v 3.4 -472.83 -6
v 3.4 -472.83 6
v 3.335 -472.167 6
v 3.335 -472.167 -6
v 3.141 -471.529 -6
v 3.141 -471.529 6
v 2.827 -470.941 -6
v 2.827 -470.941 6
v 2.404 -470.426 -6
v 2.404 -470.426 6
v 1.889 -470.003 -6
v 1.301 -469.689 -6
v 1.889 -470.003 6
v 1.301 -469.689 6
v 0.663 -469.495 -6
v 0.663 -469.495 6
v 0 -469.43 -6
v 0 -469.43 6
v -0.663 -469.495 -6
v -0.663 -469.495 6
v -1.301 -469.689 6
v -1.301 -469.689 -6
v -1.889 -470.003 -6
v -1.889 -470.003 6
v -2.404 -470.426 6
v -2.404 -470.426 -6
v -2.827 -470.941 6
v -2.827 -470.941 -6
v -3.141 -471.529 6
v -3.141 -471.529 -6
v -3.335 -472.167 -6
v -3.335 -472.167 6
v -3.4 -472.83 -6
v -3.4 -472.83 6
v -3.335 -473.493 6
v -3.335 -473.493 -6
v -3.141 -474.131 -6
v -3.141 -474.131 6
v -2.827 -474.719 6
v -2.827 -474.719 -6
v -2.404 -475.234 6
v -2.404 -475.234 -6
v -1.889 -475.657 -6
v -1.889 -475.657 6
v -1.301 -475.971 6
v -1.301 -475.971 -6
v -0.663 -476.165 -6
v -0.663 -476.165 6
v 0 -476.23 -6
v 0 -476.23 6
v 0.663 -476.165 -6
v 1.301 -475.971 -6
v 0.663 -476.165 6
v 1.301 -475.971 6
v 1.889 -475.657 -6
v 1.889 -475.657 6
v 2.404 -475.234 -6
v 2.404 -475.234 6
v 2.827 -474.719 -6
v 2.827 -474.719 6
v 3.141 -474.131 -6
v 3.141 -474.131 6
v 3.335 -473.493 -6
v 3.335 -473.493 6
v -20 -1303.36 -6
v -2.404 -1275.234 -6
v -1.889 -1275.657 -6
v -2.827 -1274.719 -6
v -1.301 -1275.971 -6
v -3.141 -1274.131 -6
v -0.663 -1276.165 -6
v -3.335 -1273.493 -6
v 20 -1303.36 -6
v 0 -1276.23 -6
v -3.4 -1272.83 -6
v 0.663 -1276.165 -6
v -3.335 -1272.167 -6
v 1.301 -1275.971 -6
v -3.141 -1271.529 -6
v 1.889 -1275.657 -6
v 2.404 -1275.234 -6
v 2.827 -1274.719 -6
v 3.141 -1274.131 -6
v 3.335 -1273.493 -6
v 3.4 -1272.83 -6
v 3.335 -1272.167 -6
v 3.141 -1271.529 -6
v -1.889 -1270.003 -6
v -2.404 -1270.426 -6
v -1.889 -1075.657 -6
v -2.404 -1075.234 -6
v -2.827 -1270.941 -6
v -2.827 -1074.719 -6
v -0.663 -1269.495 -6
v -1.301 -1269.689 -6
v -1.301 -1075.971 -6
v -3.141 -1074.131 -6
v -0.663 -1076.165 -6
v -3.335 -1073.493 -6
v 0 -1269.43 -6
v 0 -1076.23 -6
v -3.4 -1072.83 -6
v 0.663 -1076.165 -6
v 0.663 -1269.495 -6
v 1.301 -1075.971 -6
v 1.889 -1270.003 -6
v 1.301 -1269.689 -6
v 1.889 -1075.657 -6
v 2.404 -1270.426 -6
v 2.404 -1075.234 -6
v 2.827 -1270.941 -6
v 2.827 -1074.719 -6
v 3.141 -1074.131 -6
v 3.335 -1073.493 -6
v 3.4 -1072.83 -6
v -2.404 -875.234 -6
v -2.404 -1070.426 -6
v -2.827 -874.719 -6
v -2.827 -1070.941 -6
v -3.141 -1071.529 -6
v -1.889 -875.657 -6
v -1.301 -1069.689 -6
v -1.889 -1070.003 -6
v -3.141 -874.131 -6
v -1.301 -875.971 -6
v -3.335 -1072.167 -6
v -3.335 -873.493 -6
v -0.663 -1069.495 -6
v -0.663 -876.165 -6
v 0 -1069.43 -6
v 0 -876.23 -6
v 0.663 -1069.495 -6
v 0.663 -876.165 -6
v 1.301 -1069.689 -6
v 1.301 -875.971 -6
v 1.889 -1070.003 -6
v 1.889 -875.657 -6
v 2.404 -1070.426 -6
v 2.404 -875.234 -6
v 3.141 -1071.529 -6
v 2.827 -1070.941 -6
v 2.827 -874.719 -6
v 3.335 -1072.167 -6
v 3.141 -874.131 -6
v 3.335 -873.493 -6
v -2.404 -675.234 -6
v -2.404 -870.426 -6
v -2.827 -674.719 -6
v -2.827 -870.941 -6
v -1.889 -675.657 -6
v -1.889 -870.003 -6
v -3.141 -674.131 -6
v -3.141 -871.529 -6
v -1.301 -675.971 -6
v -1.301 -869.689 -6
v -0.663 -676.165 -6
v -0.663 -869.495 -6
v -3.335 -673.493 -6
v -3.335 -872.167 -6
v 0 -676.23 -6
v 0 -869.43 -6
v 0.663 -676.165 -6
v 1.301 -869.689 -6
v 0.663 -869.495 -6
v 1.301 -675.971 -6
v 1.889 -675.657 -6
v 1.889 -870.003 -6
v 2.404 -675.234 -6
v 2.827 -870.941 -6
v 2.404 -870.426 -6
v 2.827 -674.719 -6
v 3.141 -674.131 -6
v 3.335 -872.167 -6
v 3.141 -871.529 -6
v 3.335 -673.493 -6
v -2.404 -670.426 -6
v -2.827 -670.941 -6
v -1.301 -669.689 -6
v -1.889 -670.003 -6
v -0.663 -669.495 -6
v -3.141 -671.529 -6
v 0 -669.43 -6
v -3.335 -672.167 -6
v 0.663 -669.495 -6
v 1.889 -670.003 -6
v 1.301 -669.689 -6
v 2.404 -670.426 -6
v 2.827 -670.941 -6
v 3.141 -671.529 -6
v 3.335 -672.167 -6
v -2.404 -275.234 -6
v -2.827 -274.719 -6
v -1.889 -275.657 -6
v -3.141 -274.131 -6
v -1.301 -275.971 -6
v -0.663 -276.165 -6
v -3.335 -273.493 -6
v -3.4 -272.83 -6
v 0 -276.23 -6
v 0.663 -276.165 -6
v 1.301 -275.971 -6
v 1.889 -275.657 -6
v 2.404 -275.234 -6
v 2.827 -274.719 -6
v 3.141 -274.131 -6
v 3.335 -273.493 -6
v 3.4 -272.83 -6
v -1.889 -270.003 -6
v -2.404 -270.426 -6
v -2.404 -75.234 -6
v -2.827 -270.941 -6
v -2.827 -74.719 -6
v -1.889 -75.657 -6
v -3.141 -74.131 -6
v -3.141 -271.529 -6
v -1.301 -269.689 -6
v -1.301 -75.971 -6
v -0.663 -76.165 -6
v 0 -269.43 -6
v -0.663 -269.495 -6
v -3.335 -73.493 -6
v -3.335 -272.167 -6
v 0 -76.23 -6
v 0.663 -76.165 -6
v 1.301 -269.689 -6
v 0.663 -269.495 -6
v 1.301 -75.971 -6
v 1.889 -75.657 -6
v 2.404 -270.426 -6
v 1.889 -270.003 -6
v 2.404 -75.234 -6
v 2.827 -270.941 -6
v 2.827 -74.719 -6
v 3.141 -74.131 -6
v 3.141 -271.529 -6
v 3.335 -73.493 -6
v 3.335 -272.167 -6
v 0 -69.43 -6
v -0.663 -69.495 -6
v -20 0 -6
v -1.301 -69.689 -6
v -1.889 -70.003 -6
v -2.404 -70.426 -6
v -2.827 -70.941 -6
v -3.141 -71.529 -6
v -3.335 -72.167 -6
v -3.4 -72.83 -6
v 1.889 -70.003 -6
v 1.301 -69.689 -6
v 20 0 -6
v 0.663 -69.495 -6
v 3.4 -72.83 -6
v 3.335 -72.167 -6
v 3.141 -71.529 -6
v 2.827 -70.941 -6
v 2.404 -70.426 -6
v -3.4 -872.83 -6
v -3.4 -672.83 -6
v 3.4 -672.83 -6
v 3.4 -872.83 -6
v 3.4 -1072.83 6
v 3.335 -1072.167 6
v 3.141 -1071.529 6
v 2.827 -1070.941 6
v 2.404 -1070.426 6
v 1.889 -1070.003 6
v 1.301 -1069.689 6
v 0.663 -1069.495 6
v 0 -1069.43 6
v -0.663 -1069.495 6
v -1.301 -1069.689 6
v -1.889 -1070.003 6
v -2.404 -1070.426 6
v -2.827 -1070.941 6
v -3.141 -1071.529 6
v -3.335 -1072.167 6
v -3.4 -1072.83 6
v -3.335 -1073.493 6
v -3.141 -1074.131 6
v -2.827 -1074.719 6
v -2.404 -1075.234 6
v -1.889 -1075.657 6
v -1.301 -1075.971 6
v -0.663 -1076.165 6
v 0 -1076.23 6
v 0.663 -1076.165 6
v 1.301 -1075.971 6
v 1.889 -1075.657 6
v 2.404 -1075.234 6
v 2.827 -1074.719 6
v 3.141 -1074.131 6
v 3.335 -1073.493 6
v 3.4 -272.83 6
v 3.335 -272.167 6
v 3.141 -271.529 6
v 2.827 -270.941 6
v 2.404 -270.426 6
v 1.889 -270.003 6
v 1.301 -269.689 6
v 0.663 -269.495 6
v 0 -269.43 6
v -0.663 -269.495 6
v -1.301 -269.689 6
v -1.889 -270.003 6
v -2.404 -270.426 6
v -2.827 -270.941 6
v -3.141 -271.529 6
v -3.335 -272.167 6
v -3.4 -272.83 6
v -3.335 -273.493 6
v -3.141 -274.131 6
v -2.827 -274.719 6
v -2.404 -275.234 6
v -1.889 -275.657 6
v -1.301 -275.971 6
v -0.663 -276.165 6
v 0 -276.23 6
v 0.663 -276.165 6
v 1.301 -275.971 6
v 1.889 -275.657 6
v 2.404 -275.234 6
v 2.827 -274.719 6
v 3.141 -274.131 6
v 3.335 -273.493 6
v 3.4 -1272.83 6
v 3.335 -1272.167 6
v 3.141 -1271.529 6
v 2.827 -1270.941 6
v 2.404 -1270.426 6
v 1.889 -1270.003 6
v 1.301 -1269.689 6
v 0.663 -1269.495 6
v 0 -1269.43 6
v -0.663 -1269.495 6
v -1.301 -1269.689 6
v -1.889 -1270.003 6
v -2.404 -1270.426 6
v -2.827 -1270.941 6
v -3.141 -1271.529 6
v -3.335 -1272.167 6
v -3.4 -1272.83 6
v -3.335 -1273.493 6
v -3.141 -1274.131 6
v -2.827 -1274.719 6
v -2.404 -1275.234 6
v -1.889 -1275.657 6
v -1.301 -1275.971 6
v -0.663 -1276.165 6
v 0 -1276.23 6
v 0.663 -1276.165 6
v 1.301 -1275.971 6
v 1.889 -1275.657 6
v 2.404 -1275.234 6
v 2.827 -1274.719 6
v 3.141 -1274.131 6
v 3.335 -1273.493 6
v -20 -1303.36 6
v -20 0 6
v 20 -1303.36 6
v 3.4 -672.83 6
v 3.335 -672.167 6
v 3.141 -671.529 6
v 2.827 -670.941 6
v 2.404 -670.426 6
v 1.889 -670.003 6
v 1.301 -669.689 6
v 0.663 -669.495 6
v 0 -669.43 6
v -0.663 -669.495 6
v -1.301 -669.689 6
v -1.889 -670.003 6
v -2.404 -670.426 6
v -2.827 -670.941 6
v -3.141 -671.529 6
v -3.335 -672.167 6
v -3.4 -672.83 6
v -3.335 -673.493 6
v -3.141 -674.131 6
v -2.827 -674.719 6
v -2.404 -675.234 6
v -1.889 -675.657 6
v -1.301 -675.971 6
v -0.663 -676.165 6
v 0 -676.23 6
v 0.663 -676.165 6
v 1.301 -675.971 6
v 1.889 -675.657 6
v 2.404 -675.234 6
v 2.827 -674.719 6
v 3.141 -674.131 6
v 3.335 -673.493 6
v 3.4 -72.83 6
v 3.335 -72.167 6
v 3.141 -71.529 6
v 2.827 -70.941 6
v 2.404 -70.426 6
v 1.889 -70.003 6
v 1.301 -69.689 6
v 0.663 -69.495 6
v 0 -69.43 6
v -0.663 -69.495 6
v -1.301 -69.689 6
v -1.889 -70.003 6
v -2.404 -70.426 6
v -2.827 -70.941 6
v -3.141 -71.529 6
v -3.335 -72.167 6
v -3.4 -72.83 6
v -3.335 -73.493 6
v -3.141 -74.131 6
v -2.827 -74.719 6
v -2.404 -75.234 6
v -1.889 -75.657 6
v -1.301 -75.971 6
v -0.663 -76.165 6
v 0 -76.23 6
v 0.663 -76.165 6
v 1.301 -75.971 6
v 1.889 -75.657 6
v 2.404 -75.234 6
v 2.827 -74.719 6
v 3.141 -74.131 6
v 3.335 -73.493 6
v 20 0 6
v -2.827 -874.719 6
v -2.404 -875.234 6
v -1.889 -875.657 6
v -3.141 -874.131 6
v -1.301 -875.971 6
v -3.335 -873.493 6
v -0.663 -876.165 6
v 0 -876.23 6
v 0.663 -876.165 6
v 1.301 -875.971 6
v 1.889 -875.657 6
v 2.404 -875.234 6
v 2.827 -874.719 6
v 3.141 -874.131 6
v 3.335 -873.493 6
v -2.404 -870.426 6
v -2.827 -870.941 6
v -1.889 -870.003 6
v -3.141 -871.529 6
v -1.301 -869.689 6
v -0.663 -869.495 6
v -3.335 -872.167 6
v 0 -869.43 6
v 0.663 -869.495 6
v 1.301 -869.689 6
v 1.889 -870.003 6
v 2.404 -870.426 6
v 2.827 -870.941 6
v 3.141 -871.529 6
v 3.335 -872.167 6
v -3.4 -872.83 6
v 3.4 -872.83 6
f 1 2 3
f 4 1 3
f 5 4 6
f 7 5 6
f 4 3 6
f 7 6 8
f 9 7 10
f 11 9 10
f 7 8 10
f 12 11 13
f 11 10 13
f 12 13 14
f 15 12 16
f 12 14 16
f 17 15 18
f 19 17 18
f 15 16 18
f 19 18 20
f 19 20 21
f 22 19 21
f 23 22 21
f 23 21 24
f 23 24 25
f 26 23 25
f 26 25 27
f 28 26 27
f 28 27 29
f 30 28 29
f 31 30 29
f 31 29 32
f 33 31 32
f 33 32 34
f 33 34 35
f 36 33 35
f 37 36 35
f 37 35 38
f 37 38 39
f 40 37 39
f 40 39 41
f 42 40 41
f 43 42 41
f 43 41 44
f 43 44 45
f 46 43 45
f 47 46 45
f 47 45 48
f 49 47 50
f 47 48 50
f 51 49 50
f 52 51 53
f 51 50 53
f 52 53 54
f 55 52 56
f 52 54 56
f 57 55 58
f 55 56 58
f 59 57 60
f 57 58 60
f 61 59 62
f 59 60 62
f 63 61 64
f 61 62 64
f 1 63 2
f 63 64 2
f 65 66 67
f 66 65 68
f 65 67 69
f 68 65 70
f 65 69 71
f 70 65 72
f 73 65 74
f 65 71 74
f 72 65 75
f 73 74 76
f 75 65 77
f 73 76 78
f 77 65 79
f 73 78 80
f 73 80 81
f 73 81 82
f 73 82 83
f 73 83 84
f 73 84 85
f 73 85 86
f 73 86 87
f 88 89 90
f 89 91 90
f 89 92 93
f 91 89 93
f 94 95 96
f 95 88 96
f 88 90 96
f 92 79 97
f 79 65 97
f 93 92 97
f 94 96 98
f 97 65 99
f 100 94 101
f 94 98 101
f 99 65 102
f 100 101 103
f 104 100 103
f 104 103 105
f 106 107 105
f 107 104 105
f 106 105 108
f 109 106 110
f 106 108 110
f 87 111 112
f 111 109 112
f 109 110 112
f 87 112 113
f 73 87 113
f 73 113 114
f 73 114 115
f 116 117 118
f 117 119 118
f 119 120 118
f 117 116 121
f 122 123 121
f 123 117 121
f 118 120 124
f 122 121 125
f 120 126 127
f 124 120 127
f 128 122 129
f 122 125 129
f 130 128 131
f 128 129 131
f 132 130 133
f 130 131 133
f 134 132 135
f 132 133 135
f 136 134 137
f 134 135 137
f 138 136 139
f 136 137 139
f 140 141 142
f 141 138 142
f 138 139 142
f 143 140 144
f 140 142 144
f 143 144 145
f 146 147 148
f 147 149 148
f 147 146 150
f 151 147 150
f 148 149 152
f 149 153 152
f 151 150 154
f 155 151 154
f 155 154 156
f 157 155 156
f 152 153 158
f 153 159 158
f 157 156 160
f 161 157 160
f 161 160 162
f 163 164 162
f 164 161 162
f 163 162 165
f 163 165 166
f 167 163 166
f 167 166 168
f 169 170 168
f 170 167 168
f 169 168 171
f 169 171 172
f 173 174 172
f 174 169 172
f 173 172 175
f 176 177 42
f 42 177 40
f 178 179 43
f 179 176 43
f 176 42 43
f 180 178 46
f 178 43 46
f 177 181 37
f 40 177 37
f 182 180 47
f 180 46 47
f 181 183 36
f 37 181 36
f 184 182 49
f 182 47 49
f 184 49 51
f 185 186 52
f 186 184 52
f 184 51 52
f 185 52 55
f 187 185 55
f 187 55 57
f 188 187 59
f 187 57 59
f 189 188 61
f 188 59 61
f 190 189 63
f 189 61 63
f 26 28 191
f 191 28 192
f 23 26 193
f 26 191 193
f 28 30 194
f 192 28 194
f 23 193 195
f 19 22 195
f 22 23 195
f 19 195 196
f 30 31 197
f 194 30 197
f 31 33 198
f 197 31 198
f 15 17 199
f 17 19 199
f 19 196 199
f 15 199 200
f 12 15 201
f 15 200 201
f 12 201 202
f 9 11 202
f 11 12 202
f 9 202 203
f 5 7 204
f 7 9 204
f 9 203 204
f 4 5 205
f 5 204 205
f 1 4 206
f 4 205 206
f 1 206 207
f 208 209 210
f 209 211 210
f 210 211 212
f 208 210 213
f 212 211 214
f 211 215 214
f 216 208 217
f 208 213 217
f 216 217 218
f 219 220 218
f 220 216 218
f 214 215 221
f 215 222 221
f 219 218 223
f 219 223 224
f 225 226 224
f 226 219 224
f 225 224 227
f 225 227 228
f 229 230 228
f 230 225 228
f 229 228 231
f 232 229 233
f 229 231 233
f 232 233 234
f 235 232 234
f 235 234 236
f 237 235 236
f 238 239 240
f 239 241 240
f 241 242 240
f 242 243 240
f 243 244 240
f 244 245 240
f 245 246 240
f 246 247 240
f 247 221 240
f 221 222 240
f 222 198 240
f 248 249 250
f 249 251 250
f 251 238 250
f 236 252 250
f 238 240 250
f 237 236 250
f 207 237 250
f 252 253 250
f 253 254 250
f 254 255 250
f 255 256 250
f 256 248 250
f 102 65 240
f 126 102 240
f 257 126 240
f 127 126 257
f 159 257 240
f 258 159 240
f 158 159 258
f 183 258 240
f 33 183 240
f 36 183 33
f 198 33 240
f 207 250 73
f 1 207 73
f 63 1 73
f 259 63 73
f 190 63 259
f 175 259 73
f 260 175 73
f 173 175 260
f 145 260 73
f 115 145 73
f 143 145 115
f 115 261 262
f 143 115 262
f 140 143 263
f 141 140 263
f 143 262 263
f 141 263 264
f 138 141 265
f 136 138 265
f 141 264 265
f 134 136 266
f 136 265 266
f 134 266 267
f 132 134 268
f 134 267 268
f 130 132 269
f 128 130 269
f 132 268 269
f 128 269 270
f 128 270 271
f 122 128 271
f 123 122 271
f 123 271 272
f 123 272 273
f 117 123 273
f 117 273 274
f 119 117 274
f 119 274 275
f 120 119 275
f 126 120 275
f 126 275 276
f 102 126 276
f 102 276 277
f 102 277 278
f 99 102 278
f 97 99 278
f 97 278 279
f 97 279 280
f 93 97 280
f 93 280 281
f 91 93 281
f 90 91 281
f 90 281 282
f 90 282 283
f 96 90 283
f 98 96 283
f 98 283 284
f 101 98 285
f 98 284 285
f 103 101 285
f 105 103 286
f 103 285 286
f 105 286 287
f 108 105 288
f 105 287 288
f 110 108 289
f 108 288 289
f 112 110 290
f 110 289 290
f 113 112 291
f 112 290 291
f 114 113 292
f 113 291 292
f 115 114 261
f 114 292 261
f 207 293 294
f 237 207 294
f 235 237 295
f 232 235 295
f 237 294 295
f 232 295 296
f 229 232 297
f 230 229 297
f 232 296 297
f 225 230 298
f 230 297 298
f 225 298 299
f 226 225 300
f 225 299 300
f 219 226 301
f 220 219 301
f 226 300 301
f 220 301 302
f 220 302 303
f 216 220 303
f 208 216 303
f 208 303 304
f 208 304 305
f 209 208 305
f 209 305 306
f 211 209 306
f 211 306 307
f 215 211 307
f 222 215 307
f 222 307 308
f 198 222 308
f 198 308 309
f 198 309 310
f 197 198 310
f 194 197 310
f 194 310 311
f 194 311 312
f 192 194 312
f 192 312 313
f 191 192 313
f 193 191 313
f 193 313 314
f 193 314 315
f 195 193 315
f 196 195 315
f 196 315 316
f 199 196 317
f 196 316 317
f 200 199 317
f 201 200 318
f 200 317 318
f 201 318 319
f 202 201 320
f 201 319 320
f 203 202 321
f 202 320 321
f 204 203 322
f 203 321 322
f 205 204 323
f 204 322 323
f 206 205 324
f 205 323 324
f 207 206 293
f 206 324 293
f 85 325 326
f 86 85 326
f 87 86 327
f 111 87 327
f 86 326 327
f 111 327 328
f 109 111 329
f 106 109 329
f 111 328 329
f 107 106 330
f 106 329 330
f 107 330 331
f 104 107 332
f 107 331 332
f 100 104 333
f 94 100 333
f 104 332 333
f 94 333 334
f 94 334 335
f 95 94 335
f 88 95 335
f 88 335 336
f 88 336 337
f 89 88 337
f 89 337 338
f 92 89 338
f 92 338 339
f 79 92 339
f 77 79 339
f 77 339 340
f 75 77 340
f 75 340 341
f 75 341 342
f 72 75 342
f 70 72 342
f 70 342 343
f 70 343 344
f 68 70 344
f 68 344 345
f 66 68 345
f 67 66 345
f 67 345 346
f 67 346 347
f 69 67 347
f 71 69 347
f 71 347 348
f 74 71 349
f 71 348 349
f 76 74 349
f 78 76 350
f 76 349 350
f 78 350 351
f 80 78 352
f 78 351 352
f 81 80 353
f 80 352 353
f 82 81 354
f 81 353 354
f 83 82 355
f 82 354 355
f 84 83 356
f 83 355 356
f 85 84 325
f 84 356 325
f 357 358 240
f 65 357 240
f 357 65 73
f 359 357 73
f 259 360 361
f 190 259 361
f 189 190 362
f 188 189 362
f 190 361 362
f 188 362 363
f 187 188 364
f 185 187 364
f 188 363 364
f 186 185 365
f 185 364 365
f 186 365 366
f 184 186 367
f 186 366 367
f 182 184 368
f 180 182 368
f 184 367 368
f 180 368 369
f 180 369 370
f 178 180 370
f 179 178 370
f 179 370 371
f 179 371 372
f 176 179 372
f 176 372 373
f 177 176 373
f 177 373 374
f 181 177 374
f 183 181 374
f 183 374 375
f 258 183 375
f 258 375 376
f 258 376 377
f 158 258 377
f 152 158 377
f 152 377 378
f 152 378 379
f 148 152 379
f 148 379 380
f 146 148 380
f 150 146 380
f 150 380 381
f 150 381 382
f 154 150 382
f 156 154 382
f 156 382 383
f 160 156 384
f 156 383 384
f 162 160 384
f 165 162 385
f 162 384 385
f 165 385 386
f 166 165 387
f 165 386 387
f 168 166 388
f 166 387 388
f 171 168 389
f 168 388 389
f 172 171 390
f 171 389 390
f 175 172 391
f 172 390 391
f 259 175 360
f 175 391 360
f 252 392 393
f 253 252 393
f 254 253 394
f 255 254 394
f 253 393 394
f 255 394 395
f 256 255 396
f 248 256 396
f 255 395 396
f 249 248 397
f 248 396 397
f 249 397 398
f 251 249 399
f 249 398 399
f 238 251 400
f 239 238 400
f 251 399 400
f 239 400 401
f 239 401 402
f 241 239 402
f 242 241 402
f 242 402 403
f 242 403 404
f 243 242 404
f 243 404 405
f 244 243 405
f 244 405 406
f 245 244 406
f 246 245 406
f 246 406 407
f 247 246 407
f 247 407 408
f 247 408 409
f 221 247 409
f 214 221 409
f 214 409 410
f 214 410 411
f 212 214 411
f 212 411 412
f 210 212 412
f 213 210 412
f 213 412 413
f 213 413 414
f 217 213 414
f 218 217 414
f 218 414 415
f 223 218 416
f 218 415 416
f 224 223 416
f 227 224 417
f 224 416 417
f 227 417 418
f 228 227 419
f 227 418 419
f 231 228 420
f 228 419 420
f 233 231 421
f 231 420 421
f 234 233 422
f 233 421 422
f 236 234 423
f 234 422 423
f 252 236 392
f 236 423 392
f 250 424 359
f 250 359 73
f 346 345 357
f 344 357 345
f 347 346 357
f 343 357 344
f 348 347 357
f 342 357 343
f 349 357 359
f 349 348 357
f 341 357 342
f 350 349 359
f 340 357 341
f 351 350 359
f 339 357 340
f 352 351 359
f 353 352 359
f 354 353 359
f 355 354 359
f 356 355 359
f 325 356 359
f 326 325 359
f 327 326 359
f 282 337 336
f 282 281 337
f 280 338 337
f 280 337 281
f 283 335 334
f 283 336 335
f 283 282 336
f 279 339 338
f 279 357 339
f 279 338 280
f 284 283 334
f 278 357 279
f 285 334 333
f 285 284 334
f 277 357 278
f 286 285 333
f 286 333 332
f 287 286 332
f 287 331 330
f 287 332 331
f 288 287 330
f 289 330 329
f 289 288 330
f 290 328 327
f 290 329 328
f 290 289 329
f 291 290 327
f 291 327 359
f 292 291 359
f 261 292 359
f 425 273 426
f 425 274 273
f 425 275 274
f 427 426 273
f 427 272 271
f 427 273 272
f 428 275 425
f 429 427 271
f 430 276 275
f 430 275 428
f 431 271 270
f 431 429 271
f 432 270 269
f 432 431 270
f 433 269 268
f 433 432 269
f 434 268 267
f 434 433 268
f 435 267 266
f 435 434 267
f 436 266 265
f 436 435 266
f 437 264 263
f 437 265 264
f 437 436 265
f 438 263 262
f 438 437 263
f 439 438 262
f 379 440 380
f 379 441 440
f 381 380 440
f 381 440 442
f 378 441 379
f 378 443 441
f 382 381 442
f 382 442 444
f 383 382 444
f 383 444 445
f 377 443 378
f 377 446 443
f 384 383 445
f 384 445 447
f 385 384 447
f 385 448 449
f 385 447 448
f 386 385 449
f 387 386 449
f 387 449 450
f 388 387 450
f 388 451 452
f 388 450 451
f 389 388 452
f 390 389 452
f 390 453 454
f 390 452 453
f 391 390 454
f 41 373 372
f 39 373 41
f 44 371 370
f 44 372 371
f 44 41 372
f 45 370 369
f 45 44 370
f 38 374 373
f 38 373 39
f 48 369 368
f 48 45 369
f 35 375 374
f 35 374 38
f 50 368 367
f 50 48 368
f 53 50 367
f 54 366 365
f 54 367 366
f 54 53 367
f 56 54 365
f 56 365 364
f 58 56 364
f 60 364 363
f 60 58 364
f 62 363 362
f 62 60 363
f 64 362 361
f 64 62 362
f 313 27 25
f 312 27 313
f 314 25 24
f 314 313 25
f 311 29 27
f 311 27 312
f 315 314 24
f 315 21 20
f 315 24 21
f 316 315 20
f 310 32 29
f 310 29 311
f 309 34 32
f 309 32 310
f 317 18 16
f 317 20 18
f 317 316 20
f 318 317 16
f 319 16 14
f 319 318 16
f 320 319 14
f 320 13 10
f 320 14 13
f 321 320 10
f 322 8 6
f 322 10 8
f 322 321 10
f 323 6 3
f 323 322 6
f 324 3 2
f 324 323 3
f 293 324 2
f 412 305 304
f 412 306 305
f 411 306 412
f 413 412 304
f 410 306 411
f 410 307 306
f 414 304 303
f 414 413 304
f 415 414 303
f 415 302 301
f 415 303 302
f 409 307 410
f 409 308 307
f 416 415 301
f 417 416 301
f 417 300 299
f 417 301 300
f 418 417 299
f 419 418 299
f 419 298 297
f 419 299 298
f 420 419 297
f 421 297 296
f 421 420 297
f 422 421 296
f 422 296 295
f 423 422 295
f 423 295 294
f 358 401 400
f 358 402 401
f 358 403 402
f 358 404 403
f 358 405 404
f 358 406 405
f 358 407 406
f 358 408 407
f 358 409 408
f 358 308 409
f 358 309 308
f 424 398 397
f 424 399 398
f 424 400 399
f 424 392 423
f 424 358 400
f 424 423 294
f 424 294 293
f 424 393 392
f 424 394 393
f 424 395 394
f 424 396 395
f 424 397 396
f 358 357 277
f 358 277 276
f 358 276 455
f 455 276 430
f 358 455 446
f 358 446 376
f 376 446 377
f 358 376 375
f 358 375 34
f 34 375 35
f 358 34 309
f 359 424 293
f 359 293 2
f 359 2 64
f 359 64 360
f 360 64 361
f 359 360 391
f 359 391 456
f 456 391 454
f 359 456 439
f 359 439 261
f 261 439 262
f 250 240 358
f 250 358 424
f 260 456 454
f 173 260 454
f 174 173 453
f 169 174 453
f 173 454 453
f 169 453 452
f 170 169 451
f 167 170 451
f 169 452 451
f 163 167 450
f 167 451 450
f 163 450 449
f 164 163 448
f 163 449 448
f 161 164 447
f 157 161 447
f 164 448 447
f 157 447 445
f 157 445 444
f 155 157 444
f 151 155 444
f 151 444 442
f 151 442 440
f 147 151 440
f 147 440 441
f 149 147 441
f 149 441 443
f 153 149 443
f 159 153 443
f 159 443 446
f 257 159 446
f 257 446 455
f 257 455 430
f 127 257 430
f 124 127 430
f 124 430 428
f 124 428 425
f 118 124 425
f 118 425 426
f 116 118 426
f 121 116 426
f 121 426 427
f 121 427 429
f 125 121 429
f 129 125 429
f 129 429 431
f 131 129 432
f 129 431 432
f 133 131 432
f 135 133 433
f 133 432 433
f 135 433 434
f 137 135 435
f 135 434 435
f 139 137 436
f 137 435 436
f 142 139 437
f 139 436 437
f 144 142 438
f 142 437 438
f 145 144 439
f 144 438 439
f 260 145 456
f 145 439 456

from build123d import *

# Parameters (mm, degrees)
SKETCH1_W           = 40
SKETCH1_H           = 12
BOSS_EXTRUDE1_DEPTH = 1303.36
SKETCH2_R           = 3.4
CUT_EXTRUDE1_DEPTH  = 1304.568674677


with BuildPart() as part:
    # Sketch1 → Boss-Extrude1 (new body)
    with BuildSketch(Plane(origin=(0, 0, 0), x_dir=(1, 0, 0), z_dir=(0, 1, 0))):
        Rectangle(SKETCH1_W, SKETCH1_H)
    extrude(amount=-BOSS_EXTRUDE1_DEPTH)

    # Sketch2 → Cut-Extrude1 (cut, through all)
    with BuildSketch(Plane.XY.offset(6)):
        with Locations((0, -1072.83)):
            Circle(SKETCH2_R)
        with Locations((0, -872.83)):
            Circle(SKETCH2_R)
        with Locations((0, -472.83)):
            Circle(SKETCH2_R)
        with Locations((0, -272.83)):
            Circle(SKETCH2_R)
        with Locations((0, -72.83)):
            Circle(SKETCH2_R)
        with Locations((0, -672.83)):
            Circle(SKETCH2_R)
        with Locations((0, -1272.83)):
            Circle(SKETCH2_R)
    extrude(amount=-CUT_EXTRUDE1_DEPTH, mode=Mode.SUBTRACT)


solid = part.part
